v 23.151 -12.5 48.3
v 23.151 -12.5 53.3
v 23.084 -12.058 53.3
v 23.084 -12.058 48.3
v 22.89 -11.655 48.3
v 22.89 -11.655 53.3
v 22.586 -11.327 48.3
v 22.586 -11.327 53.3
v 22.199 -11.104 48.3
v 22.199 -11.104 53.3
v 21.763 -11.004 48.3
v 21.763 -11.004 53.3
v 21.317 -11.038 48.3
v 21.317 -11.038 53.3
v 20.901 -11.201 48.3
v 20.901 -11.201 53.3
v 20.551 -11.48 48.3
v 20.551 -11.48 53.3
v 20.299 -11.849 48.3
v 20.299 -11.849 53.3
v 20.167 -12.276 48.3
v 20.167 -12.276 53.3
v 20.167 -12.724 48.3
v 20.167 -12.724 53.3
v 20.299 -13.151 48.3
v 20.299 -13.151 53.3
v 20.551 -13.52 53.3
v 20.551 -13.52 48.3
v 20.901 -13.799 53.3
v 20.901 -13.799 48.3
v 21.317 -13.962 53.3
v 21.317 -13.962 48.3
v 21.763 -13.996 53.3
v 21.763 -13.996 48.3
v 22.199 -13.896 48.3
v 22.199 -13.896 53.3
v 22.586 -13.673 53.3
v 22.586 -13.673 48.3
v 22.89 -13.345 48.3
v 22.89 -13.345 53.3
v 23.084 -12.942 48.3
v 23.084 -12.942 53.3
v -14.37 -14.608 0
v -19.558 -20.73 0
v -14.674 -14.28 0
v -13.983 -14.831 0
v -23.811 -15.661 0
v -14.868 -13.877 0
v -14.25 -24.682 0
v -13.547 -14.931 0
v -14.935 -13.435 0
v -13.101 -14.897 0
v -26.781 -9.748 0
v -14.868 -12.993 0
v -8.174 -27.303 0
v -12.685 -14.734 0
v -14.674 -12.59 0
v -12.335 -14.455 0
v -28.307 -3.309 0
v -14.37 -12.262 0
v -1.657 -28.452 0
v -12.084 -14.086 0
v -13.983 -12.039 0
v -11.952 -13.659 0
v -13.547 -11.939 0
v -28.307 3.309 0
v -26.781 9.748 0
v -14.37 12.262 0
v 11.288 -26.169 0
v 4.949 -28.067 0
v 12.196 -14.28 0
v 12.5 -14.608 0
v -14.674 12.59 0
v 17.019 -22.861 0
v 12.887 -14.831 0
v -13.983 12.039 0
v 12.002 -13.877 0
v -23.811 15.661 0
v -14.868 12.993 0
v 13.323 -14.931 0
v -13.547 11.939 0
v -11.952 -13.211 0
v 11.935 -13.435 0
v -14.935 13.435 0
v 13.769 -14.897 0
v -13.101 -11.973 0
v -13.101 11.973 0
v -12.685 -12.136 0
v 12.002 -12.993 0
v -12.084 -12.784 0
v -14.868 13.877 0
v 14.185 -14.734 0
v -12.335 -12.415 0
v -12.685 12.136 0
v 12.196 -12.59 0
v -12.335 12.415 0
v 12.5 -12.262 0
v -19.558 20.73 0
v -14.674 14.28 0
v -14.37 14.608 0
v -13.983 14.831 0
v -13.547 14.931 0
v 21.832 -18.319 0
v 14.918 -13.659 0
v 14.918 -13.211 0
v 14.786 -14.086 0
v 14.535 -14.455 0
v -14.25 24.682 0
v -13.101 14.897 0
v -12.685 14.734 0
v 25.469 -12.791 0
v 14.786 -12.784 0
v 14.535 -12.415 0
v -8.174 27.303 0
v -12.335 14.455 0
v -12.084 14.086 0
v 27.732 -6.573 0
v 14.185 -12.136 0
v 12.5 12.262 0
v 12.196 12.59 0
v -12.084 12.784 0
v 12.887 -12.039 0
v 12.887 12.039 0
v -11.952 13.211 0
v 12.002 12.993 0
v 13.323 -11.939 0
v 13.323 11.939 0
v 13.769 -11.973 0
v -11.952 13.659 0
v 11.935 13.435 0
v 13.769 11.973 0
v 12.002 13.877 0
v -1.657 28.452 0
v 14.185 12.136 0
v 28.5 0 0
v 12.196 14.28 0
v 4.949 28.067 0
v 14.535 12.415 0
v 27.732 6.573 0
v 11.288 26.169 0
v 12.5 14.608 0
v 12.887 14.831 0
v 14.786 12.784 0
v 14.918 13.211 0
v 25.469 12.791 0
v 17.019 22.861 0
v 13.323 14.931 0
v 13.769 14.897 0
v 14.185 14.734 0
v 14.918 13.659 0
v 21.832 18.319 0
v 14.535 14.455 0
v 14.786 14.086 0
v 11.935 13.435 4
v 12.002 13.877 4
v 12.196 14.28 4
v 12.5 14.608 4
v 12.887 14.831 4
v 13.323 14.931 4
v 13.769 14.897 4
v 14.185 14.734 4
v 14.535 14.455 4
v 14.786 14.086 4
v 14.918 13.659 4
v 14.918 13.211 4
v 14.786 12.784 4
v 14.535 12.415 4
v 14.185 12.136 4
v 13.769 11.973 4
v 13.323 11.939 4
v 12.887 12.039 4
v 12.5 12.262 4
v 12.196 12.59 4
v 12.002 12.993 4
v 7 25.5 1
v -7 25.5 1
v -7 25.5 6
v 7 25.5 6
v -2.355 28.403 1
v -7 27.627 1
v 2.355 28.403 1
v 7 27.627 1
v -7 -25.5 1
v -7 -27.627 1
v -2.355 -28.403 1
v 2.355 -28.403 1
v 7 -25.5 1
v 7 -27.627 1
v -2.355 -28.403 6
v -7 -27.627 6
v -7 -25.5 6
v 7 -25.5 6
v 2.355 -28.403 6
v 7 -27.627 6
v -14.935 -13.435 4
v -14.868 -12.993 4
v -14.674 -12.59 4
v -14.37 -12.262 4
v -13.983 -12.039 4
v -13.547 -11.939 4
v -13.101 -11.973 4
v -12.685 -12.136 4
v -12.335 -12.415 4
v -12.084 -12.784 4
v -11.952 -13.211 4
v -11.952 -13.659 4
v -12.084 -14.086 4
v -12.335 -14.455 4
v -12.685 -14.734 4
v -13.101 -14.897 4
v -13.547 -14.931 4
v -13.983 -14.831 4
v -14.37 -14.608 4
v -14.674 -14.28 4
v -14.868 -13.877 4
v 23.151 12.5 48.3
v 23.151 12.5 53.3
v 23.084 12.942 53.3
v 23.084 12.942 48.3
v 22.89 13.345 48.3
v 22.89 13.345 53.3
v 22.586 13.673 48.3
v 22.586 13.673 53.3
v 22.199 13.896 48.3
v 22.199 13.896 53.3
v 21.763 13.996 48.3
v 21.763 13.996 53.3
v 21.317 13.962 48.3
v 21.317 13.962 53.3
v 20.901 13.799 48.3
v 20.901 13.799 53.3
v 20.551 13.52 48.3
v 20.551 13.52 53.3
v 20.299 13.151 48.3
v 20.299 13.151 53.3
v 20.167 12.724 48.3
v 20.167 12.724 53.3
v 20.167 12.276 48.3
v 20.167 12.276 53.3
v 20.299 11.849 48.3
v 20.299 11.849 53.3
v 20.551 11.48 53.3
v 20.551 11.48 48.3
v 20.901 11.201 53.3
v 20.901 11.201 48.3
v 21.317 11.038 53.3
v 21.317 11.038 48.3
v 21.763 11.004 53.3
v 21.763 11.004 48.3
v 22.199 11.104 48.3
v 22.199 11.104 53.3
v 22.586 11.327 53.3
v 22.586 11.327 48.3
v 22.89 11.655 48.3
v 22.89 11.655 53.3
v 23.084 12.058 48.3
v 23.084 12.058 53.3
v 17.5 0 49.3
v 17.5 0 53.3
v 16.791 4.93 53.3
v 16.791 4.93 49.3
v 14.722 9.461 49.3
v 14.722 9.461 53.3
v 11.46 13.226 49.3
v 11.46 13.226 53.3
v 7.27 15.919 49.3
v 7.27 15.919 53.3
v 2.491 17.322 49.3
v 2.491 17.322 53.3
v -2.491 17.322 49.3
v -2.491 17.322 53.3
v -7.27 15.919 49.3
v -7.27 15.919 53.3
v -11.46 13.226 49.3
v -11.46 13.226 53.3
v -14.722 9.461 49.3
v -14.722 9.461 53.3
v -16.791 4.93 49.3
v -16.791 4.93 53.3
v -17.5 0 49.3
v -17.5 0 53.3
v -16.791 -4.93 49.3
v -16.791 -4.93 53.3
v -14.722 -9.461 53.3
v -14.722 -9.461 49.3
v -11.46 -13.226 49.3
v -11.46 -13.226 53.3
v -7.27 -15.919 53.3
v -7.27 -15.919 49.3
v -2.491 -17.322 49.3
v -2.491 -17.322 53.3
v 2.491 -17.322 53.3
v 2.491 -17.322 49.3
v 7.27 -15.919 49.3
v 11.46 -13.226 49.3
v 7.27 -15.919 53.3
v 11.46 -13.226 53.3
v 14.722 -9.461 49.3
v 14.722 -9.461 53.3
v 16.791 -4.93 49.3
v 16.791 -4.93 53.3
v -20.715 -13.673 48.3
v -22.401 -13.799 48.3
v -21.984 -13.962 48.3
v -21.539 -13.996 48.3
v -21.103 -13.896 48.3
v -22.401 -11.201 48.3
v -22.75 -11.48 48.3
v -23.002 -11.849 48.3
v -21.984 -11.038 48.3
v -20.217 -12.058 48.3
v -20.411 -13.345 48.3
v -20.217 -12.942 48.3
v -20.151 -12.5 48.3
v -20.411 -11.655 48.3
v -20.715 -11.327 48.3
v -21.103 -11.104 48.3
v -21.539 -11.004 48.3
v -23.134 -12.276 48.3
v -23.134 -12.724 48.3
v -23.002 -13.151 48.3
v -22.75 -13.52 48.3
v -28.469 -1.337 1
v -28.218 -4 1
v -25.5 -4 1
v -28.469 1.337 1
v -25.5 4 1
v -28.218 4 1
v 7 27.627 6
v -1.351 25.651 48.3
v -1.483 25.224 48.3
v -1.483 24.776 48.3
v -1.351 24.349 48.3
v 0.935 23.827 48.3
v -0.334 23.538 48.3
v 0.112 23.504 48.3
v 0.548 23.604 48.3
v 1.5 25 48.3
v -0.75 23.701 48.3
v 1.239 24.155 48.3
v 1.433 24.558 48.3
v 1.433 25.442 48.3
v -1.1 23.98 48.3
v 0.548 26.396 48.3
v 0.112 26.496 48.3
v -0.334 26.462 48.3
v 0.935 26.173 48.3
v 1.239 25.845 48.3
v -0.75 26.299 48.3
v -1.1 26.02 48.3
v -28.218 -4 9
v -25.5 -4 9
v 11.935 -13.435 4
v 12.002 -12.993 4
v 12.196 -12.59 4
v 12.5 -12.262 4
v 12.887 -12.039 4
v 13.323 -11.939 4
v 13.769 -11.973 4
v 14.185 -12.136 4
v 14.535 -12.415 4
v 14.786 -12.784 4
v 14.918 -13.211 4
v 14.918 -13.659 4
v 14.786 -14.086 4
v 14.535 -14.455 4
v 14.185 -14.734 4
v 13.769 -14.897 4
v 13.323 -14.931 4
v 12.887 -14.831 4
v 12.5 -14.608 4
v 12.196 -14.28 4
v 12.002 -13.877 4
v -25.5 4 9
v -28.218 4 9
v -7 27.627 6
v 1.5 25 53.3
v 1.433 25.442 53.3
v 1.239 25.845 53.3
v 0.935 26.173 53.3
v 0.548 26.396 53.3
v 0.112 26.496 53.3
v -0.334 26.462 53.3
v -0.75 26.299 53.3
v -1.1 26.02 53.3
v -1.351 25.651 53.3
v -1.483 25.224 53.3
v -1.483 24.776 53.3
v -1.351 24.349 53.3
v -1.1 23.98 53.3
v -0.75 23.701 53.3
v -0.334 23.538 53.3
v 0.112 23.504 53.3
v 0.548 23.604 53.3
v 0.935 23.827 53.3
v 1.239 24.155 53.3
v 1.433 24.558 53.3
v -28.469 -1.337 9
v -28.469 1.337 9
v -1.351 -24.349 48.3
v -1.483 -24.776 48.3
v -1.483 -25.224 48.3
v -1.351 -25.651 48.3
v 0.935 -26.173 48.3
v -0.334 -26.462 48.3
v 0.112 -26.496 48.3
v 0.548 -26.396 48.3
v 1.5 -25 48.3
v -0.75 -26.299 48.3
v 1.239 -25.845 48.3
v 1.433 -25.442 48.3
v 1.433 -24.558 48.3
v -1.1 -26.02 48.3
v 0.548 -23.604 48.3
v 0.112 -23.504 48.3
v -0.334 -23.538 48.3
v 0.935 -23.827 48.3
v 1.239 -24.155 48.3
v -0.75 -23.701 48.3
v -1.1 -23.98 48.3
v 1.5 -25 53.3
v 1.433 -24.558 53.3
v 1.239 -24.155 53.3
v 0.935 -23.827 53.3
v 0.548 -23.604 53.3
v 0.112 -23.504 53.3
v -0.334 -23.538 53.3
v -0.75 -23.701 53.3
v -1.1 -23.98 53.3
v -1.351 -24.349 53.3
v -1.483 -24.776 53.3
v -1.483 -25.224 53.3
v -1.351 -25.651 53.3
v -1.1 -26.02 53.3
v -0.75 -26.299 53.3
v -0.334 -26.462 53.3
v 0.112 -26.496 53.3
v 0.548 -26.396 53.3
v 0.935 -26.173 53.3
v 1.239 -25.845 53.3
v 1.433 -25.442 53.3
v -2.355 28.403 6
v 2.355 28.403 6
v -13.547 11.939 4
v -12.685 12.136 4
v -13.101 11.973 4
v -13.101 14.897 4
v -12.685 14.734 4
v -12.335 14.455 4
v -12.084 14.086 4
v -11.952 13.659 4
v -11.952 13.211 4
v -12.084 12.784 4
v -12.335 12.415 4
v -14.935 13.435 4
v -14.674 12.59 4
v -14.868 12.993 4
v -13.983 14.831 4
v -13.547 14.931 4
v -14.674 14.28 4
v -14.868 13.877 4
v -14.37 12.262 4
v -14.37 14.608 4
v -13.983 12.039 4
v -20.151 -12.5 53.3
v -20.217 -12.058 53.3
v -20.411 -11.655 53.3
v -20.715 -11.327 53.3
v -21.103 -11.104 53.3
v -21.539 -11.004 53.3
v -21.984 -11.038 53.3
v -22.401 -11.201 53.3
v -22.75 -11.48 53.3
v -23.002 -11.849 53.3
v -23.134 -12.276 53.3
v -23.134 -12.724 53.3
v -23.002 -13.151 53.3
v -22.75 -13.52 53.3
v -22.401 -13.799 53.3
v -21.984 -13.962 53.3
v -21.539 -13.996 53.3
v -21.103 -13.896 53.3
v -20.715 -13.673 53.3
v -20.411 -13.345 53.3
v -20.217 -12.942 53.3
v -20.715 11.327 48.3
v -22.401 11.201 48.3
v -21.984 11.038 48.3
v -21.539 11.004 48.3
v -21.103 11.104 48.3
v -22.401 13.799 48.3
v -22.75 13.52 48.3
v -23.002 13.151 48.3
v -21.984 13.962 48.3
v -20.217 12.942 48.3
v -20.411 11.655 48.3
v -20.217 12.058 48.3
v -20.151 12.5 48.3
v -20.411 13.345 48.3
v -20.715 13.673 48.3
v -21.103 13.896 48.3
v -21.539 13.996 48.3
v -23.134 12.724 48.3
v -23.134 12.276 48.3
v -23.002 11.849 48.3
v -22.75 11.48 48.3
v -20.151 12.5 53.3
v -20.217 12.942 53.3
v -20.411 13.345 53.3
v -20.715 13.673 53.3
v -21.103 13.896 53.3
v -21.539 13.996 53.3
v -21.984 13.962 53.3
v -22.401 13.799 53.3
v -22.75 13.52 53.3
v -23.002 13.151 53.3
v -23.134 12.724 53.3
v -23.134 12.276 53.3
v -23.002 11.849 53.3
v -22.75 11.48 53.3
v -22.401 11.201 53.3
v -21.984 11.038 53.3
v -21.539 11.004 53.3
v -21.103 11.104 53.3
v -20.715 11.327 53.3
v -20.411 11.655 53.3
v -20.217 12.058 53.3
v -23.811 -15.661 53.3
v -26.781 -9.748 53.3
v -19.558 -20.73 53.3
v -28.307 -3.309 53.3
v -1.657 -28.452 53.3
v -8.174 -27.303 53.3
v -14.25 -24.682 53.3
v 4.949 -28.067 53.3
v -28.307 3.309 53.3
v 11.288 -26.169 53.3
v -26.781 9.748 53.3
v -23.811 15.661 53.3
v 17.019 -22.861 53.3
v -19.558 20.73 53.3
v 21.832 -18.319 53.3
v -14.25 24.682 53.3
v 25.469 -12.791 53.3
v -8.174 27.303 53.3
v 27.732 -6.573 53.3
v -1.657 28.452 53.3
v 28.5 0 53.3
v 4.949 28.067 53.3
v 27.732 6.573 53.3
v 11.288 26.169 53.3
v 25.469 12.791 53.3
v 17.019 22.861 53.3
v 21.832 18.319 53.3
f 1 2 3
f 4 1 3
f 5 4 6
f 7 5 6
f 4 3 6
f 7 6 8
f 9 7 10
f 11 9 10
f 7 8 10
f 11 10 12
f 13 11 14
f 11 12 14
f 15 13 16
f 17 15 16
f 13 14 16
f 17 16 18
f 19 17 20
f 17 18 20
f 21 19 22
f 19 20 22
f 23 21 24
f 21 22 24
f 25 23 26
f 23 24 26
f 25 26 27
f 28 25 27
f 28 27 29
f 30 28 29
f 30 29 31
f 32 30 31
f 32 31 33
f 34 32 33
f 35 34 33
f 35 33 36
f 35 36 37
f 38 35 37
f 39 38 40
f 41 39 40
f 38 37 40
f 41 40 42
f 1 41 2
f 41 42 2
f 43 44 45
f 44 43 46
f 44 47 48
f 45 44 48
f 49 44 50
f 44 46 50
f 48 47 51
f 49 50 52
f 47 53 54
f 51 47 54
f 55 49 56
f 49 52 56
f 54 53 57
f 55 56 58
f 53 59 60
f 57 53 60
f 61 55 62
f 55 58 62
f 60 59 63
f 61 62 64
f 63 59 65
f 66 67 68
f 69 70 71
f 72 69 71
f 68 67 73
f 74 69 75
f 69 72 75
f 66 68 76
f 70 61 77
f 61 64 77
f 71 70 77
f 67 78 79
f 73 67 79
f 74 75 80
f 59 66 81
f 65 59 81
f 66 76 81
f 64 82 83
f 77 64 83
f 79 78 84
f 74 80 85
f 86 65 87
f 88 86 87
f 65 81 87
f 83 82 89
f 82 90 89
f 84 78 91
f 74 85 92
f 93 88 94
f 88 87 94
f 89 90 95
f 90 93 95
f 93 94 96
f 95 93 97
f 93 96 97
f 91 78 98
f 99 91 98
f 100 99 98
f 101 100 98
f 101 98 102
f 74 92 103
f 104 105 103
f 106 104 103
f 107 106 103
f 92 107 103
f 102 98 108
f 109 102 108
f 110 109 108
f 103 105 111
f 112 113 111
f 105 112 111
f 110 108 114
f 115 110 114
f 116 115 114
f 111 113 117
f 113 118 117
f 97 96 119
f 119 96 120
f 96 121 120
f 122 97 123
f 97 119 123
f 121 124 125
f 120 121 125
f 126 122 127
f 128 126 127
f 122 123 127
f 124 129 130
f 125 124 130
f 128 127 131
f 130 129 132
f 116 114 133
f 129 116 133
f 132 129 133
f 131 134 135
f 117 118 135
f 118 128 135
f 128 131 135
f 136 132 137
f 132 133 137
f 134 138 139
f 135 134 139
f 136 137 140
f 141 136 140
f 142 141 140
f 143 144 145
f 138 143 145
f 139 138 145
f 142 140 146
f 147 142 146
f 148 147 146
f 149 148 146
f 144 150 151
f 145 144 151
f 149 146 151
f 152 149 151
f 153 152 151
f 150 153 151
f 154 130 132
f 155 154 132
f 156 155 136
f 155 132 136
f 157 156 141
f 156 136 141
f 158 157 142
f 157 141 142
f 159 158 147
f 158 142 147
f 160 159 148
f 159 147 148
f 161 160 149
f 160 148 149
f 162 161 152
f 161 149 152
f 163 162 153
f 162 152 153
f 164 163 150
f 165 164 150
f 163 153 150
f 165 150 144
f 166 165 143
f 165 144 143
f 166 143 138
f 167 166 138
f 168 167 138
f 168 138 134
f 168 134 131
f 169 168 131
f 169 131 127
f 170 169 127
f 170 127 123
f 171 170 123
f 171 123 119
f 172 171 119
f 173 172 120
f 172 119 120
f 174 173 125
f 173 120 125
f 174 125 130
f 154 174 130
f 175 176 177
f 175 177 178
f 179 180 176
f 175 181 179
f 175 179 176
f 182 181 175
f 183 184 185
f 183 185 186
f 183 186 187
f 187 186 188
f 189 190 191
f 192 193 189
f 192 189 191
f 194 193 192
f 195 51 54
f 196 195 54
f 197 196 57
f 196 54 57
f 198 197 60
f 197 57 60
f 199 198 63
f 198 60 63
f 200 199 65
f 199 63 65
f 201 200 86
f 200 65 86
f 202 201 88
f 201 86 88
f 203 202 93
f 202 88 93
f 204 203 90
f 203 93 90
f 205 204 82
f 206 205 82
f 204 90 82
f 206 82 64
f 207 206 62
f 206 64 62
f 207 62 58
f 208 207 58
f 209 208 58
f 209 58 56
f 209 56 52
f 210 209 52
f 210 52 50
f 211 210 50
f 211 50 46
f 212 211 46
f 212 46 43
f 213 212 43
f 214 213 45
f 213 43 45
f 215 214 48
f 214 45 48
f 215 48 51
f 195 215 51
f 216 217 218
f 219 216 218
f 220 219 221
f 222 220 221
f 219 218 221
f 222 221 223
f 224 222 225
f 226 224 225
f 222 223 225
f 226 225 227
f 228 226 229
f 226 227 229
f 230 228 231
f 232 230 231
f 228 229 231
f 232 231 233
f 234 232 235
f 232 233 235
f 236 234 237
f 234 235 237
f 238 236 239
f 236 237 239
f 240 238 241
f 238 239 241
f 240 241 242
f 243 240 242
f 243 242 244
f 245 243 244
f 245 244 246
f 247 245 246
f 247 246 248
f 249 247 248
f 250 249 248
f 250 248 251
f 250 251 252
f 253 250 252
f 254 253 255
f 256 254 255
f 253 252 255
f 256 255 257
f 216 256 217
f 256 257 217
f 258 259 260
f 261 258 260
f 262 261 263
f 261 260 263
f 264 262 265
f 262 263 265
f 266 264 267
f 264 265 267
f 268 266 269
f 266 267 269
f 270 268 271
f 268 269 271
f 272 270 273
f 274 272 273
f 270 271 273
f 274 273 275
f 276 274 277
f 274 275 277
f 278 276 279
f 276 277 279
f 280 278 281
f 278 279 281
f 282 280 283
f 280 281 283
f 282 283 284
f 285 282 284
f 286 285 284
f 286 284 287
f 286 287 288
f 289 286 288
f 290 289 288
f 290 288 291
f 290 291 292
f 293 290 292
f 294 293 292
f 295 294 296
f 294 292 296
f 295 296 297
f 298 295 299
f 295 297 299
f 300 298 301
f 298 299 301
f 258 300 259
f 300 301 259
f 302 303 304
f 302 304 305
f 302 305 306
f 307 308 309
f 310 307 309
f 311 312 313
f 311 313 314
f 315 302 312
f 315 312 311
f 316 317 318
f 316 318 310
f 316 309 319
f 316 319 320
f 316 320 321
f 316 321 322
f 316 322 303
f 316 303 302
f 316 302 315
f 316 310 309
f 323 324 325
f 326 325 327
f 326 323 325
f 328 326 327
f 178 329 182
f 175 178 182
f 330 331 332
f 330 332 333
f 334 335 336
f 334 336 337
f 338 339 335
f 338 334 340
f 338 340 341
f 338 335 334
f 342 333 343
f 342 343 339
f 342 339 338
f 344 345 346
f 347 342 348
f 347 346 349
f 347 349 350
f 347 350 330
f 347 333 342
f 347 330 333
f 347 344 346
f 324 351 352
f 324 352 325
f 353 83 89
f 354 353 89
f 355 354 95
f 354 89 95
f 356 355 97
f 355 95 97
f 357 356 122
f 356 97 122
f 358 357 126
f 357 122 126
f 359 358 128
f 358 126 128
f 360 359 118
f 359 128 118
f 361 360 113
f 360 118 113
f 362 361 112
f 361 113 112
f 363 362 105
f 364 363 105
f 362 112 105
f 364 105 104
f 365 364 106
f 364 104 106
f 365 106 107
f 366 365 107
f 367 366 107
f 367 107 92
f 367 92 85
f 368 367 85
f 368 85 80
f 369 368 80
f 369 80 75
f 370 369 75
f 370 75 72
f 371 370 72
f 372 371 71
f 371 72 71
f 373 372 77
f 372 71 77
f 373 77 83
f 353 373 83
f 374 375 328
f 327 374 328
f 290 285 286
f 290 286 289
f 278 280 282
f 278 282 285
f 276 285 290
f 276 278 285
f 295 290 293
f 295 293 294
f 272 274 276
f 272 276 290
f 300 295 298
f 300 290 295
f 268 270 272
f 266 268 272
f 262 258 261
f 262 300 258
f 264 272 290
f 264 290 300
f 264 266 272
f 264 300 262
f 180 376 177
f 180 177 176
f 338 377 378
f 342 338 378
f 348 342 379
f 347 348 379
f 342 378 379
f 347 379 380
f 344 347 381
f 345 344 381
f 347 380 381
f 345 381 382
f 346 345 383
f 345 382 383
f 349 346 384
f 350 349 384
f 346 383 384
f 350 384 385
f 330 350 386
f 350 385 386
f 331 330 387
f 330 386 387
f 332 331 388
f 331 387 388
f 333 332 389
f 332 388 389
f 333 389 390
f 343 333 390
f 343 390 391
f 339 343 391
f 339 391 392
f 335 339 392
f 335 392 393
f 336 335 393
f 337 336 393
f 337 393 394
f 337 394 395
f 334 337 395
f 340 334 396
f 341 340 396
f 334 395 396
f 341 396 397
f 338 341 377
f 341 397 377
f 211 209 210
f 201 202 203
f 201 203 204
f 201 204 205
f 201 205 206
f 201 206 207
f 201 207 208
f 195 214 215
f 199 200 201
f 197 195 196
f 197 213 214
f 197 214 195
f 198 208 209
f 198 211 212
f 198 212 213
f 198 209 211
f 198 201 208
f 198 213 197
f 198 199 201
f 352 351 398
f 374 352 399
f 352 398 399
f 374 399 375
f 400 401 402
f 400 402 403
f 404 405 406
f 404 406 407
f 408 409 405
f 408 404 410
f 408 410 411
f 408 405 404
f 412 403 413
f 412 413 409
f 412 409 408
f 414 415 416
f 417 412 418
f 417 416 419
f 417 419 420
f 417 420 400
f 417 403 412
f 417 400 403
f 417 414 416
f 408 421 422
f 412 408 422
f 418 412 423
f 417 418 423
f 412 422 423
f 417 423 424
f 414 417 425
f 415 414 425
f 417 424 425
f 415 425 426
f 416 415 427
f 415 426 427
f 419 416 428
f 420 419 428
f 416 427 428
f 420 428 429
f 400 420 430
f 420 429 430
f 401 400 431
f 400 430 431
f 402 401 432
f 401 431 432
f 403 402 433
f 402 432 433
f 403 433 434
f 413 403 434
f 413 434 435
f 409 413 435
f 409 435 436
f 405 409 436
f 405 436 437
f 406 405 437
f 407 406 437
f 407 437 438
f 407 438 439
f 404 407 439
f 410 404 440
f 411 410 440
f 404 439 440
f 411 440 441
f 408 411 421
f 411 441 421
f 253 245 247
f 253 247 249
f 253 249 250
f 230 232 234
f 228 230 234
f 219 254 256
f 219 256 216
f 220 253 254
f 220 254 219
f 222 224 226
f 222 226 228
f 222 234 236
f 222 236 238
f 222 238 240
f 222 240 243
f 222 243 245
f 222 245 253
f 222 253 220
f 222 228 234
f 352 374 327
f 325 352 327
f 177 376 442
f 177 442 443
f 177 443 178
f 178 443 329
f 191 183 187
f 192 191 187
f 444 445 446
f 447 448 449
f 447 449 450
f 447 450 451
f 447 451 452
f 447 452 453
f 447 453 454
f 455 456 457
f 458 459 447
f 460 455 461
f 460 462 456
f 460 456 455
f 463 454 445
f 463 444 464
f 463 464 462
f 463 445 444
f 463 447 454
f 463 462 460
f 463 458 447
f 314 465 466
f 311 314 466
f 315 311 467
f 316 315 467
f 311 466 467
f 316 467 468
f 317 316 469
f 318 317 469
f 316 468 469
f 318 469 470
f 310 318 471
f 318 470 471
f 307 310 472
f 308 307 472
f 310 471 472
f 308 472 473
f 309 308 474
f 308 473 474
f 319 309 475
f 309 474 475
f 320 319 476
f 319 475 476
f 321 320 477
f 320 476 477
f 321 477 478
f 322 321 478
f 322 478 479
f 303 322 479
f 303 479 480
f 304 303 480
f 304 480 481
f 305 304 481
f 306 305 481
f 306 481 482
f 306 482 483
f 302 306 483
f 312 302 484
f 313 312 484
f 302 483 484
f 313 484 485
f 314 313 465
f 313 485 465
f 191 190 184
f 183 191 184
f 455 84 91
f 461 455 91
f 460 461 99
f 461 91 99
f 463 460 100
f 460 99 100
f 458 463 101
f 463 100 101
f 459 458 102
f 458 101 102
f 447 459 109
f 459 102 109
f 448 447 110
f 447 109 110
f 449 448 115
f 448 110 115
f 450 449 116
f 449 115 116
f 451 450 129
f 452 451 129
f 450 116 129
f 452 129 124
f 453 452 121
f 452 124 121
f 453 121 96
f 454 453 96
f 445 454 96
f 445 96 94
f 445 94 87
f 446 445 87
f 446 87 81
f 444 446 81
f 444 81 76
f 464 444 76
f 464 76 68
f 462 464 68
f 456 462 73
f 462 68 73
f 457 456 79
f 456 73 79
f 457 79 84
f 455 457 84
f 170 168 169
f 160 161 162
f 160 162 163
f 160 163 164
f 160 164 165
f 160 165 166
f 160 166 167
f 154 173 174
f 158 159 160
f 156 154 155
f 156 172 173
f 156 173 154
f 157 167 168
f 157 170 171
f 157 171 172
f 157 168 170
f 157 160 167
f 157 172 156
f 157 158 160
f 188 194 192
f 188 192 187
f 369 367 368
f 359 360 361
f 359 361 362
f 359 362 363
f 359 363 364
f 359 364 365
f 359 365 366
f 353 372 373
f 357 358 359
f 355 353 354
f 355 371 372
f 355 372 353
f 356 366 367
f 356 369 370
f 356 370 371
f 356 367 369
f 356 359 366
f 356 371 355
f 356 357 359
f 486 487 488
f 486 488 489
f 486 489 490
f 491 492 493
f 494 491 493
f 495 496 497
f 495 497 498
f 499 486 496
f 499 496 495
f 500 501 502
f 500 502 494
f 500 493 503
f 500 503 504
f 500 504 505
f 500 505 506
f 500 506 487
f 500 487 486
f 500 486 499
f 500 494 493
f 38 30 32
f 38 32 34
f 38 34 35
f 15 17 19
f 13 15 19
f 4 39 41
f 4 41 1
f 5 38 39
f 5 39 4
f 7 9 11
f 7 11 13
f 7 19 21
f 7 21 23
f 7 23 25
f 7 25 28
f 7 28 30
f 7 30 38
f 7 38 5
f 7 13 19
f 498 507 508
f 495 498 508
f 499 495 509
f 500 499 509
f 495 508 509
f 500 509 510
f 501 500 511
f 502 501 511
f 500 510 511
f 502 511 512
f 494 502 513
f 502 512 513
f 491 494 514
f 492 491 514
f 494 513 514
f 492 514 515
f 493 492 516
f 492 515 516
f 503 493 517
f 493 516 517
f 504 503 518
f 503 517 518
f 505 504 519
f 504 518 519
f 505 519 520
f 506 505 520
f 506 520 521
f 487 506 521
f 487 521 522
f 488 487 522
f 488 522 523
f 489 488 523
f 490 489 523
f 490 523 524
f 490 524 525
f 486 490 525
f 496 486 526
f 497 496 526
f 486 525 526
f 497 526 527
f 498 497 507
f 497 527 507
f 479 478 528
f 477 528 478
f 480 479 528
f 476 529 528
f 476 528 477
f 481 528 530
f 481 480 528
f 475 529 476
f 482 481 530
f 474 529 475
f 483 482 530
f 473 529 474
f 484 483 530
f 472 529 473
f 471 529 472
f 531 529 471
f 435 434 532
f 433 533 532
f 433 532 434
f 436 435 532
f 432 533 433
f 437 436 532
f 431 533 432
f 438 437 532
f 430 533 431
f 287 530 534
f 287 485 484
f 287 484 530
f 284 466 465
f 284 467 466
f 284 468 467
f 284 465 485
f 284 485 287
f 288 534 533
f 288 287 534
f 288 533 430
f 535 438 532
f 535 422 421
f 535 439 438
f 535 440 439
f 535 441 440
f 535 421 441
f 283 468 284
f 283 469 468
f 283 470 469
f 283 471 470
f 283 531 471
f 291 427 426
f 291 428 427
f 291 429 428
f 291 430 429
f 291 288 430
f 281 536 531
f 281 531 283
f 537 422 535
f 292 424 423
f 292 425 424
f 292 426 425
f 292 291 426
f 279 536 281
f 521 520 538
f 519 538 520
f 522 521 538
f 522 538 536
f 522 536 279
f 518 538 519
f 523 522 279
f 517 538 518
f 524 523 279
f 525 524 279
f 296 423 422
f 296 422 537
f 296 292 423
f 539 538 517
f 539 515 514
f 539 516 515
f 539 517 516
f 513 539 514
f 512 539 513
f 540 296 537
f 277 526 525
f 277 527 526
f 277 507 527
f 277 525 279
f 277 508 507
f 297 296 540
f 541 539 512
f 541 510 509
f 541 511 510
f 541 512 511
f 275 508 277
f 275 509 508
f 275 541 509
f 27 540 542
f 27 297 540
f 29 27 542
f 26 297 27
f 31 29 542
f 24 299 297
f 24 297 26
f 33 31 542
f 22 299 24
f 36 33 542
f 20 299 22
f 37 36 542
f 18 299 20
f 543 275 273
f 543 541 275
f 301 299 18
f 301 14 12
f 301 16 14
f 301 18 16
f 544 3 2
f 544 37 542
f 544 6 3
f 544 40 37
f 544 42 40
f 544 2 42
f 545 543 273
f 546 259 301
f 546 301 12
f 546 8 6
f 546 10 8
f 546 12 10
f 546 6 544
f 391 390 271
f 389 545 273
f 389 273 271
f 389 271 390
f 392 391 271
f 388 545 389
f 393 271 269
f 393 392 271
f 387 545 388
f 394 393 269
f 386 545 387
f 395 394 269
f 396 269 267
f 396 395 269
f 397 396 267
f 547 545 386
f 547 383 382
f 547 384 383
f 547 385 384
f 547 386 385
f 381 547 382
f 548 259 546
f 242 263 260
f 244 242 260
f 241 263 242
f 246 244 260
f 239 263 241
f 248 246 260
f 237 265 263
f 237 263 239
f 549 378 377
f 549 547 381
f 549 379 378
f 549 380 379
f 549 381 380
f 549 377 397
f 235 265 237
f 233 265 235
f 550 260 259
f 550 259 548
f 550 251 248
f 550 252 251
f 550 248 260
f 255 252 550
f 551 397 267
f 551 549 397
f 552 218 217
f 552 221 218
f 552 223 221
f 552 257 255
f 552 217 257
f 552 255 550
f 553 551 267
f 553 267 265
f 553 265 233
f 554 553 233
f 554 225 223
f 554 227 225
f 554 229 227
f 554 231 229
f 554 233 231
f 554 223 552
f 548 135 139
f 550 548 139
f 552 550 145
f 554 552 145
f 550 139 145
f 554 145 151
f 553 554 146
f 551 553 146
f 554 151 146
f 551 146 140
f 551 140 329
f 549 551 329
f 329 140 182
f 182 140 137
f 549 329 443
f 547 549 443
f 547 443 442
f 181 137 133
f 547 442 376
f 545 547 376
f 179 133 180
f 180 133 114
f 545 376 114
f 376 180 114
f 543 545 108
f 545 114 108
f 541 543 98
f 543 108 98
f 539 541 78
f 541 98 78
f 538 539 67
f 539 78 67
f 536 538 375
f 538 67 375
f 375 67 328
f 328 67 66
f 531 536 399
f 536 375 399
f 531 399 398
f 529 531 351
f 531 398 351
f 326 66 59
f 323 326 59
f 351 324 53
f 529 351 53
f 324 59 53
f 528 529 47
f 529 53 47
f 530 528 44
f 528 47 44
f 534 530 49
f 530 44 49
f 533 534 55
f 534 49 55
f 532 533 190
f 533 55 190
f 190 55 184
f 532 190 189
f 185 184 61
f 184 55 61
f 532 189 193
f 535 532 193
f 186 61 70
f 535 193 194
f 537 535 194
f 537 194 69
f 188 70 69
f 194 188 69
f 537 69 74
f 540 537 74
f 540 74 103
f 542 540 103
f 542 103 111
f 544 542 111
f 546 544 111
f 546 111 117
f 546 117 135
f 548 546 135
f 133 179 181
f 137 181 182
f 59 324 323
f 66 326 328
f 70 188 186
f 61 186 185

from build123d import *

# Parameters (mm, degrees)
SKETCH_1_R          = 28.5
EXTRUDE_1_DEPTH     = 53.3
SKETCH_2_R          = 17.5
CUT_EXTRUDE_2_DEPTH = 4
SKETCH_2_5_R        = 1.5
CUT_EXTRUDE_3_DEPTH = 5
SKETCH_4_R          = 1.5
CUT_EXTRUDE_4_DEPTH = 4
SKETCH_9_W          = 14
SKETCH_9_H          = 5
CUT_EXTRUDE_6_DEPTH = 3
SKETCH_10_W         = 8
SKETCH_10_H         = 8
CUT_EXTRUDE_7_DEPTH = 3


with BuildPart() as part:
    # 草图1 → 凸台-拉伸1 (new body)
    with BuildSketch(Plane.XY):
        Circle(SKETCH_1_R)
    extrude(amount=EXTRUDE_1_DEPTH)

    # 草图2 → 切除-拉伸2 (cut)
    with BuildSketch(Plane.XY.offset(53.3)):
        Circle(SKETCH_2_R)
    extrude(amount=-CUT_EXTRUDE_2_DEPTH, mode=Mode.SUBTRACT)

    # 草图2<5> → 切除-拉伸3 (cut)
    with BuildSketch(Plane.XY.offset(53.3)):
        with Locations((0, 25)):
            Circle(SKETCH_2_5_R)
        with Locations((21.650635095, 12.5)):
            Circle(SKETCH_2_5_R)
        with Locations((21.650635095, -12.5)):
            Circle(SKETCH_2_5_R)
        with Locations((0, -25)):
            Circle(SKETCH_2_5_R)
        with Locations((-21.650635095, -12.5)):
            Circle(SKETCH_2_5_R)
        with Locations((-21.650635095, 12.5)):
            Circle(SKETCH_2_5_R)
    extrude(amount=-CUT_EXTRUDE_3_DEPTH, mode=Mode.SUBTRACT)

    # 草图4 → 切除-拉伸4 (cut)
    with BuildSketch(Plane(origin=(0, 0, 0), x_dir=(-1, 0, 0), z_dir=(0, 0, -1))):
        with Locations((13.435028843, 13.435028843)):
            Circle(SKETCH_4_R)
        with Locations((-13.435028843, 13.435028843)):
            Circle(SKETCH_4_R)
        with Locations((13.435028843, -13.435028843)):
            Circle(SKETCH_4_R)
        with Locations((-13.435028843, -13.435028843)):
            Circle(SKETCH_4_R)
    extrude(amount=-CUT_EXTRUDE_4_DEPTH, mode=Mode.SUBTRACT)

    # 草图9 → 切除-拉伸6 (cut)
    with BuildSketch(Plane(origin=(0, 28.5, 0), x_dir=(1, 0, 0), z_dir=(0, 1, 0))):
        with Locations((0, -3.5)):
            Rectangle(SKETCH_9_W, SKETCH_9_H)
    cut_extrude_6 = extrude(amount=-CUT_EXTRUDE_6_DEPTH, mode=Mode.SUBTRACT)

    # 镜向1: 切除-拉伸6 across plane
    add(cut_extrude_6.mirror(Plane.ZX), mode=Mode.SUBTRACT)

    # 草图10 → 切除-拉伸7 (cut)
    with BuildSketch(Plane(origin=(-28.5, 0, 0), x_dir=(0, 0, -1), z_dir=(1, 0, 0))):
        with Locations((-5, 0)):
            Rectangle(SKETCH_10_W, SKETCH_10_H)
    extrude(amount=CUT_EXTRUDE_7_DEPTH, mode=Mode.SUBTRACT)


solid = part.part
